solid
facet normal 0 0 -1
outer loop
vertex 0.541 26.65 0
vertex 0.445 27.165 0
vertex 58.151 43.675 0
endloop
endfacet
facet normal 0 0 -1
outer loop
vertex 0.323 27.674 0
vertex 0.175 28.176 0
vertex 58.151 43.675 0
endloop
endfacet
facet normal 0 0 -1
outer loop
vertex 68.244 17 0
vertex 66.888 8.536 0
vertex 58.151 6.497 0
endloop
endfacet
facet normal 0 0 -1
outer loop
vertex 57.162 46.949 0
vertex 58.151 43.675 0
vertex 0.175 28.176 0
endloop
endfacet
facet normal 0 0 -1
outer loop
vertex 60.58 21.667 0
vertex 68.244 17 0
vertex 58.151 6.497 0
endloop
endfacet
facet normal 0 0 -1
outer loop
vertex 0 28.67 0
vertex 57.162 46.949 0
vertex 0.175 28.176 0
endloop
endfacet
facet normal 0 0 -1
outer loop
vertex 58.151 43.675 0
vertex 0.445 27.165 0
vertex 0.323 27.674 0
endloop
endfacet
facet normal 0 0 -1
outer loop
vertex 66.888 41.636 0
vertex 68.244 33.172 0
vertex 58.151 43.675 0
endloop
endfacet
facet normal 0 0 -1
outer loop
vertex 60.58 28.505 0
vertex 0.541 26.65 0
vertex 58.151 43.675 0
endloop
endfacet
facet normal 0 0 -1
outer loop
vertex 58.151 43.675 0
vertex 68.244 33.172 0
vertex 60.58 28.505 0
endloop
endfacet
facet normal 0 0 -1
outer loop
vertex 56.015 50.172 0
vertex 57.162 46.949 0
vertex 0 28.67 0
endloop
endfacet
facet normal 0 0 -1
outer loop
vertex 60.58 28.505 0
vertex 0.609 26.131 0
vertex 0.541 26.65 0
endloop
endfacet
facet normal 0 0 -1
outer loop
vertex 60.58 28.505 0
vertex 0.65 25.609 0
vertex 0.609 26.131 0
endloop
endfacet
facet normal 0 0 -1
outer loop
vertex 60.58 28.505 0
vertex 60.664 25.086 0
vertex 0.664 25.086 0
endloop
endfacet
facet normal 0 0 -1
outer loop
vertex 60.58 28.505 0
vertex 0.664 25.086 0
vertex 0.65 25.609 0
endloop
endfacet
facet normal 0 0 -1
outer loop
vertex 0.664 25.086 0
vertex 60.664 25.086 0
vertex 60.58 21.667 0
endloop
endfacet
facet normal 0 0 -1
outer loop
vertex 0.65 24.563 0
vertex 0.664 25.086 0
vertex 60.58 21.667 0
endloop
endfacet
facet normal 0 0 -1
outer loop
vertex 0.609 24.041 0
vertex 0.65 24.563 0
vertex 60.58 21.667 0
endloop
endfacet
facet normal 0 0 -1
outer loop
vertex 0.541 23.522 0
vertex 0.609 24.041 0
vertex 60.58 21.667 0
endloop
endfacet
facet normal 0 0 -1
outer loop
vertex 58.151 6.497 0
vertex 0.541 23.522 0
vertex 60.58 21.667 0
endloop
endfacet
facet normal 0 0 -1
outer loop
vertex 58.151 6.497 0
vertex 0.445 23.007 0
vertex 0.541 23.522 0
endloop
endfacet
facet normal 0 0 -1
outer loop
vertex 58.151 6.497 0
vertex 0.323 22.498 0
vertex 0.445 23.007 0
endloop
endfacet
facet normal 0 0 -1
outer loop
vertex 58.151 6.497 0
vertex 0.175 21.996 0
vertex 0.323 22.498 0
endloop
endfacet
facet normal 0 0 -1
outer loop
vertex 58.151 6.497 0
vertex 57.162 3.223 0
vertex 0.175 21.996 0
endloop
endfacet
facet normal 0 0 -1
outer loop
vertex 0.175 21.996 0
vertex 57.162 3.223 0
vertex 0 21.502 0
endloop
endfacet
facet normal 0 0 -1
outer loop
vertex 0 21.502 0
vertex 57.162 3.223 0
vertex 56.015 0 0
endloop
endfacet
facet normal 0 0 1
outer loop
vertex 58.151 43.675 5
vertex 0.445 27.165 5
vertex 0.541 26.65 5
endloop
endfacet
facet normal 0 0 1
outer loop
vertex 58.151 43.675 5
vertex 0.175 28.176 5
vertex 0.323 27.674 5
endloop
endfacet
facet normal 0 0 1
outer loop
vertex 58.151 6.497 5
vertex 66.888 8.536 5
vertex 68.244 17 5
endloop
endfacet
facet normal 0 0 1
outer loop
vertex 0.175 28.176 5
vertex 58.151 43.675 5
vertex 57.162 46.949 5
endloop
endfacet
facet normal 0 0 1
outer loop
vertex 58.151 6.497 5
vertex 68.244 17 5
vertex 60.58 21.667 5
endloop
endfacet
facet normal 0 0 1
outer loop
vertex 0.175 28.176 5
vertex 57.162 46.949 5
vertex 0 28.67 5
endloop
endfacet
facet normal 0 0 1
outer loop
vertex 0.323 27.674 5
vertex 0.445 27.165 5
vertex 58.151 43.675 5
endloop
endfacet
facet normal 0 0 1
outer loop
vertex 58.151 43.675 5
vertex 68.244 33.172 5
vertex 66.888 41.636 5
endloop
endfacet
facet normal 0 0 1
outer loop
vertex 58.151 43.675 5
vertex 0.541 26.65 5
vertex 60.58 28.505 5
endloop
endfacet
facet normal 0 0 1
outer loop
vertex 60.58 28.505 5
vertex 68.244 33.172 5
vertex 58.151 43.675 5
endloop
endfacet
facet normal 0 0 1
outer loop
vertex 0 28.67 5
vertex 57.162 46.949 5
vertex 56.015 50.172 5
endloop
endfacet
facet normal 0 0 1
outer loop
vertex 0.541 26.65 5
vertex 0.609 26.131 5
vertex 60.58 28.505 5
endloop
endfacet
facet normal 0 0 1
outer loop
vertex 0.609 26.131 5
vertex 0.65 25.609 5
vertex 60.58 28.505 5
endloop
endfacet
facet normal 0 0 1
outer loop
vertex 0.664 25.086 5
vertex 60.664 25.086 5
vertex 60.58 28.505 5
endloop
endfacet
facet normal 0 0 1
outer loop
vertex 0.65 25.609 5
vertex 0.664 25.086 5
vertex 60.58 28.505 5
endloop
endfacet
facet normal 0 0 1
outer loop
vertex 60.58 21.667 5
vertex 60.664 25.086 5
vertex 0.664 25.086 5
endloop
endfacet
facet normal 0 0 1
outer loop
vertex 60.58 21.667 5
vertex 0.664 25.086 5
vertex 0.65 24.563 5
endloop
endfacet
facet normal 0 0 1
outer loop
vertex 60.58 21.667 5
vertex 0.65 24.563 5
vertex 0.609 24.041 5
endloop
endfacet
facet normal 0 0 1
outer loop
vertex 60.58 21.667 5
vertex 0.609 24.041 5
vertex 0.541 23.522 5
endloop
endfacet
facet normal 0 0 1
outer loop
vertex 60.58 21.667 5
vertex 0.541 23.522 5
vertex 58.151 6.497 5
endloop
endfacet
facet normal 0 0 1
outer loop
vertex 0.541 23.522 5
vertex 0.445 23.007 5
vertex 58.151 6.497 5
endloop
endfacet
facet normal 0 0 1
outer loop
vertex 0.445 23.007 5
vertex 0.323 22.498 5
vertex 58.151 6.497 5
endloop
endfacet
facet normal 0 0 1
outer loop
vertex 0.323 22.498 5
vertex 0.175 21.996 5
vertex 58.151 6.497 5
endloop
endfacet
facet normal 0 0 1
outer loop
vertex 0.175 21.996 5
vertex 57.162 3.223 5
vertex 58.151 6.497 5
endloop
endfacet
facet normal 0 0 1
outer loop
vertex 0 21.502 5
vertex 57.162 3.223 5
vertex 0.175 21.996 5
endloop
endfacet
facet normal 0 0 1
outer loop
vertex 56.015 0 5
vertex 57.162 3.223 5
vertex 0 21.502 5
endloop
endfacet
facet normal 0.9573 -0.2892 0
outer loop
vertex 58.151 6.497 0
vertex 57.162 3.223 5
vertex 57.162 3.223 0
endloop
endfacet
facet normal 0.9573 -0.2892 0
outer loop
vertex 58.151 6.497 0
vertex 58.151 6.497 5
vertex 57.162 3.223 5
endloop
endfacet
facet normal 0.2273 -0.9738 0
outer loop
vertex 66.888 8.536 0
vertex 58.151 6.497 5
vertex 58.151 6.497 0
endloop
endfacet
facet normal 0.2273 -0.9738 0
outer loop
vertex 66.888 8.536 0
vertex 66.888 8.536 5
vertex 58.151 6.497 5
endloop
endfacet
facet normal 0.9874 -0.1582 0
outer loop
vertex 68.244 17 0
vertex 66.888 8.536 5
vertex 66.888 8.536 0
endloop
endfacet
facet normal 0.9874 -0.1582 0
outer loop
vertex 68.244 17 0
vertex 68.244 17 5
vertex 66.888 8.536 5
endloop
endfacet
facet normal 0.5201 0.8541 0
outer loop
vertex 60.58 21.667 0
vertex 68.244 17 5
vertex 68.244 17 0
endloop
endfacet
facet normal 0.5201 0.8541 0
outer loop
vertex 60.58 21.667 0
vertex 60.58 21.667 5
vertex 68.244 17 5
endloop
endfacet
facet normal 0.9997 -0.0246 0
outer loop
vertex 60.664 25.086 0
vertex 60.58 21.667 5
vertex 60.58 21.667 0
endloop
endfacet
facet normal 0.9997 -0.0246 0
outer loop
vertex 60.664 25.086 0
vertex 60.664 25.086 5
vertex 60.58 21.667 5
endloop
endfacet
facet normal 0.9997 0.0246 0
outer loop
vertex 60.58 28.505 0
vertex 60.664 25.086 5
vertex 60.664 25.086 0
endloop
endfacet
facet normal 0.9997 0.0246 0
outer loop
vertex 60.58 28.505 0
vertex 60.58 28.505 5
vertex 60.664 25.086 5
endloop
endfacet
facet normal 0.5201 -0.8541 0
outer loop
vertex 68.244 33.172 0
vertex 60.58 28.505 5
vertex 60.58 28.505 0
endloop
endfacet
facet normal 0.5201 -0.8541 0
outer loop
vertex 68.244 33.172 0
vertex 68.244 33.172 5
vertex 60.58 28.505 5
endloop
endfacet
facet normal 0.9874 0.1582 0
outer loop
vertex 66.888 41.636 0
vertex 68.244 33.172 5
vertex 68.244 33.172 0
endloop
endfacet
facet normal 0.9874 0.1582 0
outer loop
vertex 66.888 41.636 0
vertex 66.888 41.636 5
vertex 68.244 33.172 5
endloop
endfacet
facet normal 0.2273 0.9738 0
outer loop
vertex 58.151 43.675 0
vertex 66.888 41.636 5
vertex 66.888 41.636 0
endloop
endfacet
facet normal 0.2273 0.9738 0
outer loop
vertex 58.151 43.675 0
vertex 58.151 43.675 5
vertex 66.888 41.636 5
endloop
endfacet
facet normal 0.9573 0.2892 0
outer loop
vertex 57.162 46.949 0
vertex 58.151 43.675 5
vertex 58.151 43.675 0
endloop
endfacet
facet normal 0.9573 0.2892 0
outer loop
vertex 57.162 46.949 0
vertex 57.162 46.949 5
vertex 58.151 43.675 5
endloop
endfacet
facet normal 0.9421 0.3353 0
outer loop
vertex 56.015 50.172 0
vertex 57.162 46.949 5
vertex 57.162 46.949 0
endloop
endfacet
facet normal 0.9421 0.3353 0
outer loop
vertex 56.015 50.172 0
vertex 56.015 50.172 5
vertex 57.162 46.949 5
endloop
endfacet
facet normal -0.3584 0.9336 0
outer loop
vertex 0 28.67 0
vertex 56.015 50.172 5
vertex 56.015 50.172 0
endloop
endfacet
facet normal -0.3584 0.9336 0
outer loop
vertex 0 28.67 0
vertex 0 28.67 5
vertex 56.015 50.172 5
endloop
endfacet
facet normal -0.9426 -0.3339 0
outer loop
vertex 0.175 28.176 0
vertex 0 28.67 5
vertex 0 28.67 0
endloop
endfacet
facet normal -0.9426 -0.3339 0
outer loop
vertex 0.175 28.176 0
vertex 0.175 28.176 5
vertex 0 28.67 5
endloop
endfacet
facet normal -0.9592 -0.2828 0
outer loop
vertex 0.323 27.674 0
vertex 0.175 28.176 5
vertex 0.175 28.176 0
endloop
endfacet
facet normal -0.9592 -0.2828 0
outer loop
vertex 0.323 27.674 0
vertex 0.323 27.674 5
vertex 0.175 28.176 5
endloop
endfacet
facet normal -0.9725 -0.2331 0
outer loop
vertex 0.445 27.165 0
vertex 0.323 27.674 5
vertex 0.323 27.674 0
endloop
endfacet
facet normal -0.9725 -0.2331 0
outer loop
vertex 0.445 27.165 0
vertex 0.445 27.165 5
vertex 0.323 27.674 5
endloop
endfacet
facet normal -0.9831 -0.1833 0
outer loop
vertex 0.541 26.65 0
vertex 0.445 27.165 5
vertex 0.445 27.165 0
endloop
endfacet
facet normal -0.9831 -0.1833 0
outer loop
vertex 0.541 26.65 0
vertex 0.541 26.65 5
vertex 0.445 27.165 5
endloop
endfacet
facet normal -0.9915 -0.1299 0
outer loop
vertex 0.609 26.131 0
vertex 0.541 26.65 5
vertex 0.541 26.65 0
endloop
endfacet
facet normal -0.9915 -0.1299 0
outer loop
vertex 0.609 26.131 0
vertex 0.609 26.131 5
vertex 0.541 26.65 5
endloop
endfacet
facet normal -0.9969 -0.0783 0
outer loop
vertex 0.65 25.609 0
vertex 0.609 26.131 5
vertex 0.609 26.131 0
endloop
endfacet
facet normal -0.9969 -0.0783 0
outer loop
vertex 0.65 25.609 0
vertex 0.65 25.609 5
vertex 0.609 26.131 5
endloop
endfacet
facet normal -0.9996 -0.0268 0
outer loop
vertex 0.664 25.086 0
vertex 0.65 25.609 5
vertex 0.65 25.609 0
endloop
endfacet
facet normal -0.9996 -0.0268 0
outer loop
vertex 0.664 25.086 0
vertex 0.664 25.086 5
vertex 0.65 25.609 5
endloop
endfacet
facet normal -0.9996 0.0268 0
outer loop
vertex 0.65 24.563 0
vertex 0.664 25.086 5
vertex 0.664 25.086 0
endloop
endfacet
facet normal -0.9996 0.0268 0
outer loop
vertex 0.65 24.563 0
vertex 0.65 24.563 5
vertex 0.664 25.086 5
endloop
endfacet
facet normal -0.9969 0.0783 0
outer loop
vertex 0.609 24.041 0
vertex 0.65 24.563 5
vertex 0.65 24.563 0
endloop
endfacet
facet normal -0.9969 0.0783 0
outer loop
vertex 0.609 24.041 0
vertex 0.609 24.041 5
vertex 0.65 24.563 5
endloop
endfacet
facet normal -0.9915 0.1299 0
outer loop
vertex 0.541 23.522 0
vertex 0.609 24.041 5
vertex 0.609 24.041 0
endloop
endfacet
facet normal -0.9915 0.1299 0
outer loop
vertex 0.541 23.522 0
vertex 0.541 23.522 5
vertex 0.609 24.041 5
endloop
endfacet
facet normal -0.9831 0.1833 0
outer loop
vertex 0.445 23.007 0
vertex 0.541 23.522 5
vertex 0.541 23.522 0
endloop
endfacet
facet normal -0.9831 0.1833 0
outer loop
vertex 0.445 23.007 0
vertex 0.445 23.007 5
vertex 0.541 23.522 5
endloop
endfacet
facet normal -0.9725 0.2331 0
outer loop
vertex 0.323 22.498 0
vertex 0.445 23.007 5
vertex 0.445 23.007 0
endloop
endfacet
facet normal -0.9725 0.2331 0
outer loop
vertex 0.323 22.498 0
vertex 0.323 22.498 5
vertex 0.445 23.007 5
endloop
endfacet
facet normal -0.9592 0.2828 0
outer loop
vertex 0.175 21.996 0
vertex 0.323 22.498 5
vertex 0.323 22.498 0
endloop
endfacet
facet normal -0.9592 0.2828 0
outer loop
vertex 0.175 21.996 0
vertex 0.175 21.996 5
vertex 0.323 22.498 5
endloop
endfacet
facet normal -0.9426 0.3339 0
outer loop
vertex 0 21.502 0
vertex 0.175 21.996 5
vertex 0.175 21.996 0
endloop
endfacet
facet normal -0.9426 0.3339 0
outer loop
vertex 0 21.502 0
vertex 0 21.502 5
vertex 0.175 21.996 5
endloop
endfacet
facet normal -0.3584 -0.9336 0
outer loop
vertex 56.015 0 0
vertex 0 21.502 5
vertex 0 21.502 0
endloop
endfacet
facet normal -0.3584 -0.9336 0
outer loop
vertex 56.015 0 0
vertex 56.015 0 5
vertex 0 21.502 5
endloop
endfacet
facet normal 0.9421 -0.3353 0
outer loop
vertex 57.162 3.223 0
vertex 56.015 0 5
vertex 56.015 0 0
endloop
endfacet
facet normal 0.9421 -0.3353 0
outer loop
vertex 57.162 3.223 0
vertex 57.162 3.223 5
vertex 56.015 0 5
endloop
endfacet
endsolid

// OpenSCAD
$fn = 32;

// ----------------------------------------------------------------------
// Gear sector: 2 teeth on 42 degrees
// ----------------------------------------------------------------------

// --- parameters (mm) ---
sector_angle = 42;        // sector angle, degrees
root_r = 70;              // root circle radius
tooth_h = 8;              // tooth height over the root circle
teeth = 2;                // number of teeth on the sector
hub_r = 10;               // hub bore radius
plate_t = 5;              // sector thickness, Z
arc_step = 3;             // sampling step of the root/hub arcs, degrees

tip_r = root_r + tooth_h;  // tip circle radius

profile = [[56.015, 0], [57.162, 3.223], [58.151, 6.497], [66.888, 8.536], [68.244, 17], [60.58, 21.667], [60.664, 25.086], [60.58, 28.505], [68.244, 33.172], [66.888, 41.636], [58.151, 43.675], [57.162, 46.949], [56.015, 50.172], [0, 28.67], [0.175, 28.176], [0.323, 27.674], [0.445, 27.165], [0.541, 26.65], [0.609, 26.131], [0.65, 25.609], [0.664, 25.086], [0.65, 24.563], [0.609, 24.041], [0.541, 23.522], [0.445, 23.007], [0.323, 22.498], [0.175, 21.996], [0, 21.502]];  // primary outline, 28 points, counter clockwise

// --- the one profile operation ---
linear_extrude(height = plate_t) polygon(points = profile);
